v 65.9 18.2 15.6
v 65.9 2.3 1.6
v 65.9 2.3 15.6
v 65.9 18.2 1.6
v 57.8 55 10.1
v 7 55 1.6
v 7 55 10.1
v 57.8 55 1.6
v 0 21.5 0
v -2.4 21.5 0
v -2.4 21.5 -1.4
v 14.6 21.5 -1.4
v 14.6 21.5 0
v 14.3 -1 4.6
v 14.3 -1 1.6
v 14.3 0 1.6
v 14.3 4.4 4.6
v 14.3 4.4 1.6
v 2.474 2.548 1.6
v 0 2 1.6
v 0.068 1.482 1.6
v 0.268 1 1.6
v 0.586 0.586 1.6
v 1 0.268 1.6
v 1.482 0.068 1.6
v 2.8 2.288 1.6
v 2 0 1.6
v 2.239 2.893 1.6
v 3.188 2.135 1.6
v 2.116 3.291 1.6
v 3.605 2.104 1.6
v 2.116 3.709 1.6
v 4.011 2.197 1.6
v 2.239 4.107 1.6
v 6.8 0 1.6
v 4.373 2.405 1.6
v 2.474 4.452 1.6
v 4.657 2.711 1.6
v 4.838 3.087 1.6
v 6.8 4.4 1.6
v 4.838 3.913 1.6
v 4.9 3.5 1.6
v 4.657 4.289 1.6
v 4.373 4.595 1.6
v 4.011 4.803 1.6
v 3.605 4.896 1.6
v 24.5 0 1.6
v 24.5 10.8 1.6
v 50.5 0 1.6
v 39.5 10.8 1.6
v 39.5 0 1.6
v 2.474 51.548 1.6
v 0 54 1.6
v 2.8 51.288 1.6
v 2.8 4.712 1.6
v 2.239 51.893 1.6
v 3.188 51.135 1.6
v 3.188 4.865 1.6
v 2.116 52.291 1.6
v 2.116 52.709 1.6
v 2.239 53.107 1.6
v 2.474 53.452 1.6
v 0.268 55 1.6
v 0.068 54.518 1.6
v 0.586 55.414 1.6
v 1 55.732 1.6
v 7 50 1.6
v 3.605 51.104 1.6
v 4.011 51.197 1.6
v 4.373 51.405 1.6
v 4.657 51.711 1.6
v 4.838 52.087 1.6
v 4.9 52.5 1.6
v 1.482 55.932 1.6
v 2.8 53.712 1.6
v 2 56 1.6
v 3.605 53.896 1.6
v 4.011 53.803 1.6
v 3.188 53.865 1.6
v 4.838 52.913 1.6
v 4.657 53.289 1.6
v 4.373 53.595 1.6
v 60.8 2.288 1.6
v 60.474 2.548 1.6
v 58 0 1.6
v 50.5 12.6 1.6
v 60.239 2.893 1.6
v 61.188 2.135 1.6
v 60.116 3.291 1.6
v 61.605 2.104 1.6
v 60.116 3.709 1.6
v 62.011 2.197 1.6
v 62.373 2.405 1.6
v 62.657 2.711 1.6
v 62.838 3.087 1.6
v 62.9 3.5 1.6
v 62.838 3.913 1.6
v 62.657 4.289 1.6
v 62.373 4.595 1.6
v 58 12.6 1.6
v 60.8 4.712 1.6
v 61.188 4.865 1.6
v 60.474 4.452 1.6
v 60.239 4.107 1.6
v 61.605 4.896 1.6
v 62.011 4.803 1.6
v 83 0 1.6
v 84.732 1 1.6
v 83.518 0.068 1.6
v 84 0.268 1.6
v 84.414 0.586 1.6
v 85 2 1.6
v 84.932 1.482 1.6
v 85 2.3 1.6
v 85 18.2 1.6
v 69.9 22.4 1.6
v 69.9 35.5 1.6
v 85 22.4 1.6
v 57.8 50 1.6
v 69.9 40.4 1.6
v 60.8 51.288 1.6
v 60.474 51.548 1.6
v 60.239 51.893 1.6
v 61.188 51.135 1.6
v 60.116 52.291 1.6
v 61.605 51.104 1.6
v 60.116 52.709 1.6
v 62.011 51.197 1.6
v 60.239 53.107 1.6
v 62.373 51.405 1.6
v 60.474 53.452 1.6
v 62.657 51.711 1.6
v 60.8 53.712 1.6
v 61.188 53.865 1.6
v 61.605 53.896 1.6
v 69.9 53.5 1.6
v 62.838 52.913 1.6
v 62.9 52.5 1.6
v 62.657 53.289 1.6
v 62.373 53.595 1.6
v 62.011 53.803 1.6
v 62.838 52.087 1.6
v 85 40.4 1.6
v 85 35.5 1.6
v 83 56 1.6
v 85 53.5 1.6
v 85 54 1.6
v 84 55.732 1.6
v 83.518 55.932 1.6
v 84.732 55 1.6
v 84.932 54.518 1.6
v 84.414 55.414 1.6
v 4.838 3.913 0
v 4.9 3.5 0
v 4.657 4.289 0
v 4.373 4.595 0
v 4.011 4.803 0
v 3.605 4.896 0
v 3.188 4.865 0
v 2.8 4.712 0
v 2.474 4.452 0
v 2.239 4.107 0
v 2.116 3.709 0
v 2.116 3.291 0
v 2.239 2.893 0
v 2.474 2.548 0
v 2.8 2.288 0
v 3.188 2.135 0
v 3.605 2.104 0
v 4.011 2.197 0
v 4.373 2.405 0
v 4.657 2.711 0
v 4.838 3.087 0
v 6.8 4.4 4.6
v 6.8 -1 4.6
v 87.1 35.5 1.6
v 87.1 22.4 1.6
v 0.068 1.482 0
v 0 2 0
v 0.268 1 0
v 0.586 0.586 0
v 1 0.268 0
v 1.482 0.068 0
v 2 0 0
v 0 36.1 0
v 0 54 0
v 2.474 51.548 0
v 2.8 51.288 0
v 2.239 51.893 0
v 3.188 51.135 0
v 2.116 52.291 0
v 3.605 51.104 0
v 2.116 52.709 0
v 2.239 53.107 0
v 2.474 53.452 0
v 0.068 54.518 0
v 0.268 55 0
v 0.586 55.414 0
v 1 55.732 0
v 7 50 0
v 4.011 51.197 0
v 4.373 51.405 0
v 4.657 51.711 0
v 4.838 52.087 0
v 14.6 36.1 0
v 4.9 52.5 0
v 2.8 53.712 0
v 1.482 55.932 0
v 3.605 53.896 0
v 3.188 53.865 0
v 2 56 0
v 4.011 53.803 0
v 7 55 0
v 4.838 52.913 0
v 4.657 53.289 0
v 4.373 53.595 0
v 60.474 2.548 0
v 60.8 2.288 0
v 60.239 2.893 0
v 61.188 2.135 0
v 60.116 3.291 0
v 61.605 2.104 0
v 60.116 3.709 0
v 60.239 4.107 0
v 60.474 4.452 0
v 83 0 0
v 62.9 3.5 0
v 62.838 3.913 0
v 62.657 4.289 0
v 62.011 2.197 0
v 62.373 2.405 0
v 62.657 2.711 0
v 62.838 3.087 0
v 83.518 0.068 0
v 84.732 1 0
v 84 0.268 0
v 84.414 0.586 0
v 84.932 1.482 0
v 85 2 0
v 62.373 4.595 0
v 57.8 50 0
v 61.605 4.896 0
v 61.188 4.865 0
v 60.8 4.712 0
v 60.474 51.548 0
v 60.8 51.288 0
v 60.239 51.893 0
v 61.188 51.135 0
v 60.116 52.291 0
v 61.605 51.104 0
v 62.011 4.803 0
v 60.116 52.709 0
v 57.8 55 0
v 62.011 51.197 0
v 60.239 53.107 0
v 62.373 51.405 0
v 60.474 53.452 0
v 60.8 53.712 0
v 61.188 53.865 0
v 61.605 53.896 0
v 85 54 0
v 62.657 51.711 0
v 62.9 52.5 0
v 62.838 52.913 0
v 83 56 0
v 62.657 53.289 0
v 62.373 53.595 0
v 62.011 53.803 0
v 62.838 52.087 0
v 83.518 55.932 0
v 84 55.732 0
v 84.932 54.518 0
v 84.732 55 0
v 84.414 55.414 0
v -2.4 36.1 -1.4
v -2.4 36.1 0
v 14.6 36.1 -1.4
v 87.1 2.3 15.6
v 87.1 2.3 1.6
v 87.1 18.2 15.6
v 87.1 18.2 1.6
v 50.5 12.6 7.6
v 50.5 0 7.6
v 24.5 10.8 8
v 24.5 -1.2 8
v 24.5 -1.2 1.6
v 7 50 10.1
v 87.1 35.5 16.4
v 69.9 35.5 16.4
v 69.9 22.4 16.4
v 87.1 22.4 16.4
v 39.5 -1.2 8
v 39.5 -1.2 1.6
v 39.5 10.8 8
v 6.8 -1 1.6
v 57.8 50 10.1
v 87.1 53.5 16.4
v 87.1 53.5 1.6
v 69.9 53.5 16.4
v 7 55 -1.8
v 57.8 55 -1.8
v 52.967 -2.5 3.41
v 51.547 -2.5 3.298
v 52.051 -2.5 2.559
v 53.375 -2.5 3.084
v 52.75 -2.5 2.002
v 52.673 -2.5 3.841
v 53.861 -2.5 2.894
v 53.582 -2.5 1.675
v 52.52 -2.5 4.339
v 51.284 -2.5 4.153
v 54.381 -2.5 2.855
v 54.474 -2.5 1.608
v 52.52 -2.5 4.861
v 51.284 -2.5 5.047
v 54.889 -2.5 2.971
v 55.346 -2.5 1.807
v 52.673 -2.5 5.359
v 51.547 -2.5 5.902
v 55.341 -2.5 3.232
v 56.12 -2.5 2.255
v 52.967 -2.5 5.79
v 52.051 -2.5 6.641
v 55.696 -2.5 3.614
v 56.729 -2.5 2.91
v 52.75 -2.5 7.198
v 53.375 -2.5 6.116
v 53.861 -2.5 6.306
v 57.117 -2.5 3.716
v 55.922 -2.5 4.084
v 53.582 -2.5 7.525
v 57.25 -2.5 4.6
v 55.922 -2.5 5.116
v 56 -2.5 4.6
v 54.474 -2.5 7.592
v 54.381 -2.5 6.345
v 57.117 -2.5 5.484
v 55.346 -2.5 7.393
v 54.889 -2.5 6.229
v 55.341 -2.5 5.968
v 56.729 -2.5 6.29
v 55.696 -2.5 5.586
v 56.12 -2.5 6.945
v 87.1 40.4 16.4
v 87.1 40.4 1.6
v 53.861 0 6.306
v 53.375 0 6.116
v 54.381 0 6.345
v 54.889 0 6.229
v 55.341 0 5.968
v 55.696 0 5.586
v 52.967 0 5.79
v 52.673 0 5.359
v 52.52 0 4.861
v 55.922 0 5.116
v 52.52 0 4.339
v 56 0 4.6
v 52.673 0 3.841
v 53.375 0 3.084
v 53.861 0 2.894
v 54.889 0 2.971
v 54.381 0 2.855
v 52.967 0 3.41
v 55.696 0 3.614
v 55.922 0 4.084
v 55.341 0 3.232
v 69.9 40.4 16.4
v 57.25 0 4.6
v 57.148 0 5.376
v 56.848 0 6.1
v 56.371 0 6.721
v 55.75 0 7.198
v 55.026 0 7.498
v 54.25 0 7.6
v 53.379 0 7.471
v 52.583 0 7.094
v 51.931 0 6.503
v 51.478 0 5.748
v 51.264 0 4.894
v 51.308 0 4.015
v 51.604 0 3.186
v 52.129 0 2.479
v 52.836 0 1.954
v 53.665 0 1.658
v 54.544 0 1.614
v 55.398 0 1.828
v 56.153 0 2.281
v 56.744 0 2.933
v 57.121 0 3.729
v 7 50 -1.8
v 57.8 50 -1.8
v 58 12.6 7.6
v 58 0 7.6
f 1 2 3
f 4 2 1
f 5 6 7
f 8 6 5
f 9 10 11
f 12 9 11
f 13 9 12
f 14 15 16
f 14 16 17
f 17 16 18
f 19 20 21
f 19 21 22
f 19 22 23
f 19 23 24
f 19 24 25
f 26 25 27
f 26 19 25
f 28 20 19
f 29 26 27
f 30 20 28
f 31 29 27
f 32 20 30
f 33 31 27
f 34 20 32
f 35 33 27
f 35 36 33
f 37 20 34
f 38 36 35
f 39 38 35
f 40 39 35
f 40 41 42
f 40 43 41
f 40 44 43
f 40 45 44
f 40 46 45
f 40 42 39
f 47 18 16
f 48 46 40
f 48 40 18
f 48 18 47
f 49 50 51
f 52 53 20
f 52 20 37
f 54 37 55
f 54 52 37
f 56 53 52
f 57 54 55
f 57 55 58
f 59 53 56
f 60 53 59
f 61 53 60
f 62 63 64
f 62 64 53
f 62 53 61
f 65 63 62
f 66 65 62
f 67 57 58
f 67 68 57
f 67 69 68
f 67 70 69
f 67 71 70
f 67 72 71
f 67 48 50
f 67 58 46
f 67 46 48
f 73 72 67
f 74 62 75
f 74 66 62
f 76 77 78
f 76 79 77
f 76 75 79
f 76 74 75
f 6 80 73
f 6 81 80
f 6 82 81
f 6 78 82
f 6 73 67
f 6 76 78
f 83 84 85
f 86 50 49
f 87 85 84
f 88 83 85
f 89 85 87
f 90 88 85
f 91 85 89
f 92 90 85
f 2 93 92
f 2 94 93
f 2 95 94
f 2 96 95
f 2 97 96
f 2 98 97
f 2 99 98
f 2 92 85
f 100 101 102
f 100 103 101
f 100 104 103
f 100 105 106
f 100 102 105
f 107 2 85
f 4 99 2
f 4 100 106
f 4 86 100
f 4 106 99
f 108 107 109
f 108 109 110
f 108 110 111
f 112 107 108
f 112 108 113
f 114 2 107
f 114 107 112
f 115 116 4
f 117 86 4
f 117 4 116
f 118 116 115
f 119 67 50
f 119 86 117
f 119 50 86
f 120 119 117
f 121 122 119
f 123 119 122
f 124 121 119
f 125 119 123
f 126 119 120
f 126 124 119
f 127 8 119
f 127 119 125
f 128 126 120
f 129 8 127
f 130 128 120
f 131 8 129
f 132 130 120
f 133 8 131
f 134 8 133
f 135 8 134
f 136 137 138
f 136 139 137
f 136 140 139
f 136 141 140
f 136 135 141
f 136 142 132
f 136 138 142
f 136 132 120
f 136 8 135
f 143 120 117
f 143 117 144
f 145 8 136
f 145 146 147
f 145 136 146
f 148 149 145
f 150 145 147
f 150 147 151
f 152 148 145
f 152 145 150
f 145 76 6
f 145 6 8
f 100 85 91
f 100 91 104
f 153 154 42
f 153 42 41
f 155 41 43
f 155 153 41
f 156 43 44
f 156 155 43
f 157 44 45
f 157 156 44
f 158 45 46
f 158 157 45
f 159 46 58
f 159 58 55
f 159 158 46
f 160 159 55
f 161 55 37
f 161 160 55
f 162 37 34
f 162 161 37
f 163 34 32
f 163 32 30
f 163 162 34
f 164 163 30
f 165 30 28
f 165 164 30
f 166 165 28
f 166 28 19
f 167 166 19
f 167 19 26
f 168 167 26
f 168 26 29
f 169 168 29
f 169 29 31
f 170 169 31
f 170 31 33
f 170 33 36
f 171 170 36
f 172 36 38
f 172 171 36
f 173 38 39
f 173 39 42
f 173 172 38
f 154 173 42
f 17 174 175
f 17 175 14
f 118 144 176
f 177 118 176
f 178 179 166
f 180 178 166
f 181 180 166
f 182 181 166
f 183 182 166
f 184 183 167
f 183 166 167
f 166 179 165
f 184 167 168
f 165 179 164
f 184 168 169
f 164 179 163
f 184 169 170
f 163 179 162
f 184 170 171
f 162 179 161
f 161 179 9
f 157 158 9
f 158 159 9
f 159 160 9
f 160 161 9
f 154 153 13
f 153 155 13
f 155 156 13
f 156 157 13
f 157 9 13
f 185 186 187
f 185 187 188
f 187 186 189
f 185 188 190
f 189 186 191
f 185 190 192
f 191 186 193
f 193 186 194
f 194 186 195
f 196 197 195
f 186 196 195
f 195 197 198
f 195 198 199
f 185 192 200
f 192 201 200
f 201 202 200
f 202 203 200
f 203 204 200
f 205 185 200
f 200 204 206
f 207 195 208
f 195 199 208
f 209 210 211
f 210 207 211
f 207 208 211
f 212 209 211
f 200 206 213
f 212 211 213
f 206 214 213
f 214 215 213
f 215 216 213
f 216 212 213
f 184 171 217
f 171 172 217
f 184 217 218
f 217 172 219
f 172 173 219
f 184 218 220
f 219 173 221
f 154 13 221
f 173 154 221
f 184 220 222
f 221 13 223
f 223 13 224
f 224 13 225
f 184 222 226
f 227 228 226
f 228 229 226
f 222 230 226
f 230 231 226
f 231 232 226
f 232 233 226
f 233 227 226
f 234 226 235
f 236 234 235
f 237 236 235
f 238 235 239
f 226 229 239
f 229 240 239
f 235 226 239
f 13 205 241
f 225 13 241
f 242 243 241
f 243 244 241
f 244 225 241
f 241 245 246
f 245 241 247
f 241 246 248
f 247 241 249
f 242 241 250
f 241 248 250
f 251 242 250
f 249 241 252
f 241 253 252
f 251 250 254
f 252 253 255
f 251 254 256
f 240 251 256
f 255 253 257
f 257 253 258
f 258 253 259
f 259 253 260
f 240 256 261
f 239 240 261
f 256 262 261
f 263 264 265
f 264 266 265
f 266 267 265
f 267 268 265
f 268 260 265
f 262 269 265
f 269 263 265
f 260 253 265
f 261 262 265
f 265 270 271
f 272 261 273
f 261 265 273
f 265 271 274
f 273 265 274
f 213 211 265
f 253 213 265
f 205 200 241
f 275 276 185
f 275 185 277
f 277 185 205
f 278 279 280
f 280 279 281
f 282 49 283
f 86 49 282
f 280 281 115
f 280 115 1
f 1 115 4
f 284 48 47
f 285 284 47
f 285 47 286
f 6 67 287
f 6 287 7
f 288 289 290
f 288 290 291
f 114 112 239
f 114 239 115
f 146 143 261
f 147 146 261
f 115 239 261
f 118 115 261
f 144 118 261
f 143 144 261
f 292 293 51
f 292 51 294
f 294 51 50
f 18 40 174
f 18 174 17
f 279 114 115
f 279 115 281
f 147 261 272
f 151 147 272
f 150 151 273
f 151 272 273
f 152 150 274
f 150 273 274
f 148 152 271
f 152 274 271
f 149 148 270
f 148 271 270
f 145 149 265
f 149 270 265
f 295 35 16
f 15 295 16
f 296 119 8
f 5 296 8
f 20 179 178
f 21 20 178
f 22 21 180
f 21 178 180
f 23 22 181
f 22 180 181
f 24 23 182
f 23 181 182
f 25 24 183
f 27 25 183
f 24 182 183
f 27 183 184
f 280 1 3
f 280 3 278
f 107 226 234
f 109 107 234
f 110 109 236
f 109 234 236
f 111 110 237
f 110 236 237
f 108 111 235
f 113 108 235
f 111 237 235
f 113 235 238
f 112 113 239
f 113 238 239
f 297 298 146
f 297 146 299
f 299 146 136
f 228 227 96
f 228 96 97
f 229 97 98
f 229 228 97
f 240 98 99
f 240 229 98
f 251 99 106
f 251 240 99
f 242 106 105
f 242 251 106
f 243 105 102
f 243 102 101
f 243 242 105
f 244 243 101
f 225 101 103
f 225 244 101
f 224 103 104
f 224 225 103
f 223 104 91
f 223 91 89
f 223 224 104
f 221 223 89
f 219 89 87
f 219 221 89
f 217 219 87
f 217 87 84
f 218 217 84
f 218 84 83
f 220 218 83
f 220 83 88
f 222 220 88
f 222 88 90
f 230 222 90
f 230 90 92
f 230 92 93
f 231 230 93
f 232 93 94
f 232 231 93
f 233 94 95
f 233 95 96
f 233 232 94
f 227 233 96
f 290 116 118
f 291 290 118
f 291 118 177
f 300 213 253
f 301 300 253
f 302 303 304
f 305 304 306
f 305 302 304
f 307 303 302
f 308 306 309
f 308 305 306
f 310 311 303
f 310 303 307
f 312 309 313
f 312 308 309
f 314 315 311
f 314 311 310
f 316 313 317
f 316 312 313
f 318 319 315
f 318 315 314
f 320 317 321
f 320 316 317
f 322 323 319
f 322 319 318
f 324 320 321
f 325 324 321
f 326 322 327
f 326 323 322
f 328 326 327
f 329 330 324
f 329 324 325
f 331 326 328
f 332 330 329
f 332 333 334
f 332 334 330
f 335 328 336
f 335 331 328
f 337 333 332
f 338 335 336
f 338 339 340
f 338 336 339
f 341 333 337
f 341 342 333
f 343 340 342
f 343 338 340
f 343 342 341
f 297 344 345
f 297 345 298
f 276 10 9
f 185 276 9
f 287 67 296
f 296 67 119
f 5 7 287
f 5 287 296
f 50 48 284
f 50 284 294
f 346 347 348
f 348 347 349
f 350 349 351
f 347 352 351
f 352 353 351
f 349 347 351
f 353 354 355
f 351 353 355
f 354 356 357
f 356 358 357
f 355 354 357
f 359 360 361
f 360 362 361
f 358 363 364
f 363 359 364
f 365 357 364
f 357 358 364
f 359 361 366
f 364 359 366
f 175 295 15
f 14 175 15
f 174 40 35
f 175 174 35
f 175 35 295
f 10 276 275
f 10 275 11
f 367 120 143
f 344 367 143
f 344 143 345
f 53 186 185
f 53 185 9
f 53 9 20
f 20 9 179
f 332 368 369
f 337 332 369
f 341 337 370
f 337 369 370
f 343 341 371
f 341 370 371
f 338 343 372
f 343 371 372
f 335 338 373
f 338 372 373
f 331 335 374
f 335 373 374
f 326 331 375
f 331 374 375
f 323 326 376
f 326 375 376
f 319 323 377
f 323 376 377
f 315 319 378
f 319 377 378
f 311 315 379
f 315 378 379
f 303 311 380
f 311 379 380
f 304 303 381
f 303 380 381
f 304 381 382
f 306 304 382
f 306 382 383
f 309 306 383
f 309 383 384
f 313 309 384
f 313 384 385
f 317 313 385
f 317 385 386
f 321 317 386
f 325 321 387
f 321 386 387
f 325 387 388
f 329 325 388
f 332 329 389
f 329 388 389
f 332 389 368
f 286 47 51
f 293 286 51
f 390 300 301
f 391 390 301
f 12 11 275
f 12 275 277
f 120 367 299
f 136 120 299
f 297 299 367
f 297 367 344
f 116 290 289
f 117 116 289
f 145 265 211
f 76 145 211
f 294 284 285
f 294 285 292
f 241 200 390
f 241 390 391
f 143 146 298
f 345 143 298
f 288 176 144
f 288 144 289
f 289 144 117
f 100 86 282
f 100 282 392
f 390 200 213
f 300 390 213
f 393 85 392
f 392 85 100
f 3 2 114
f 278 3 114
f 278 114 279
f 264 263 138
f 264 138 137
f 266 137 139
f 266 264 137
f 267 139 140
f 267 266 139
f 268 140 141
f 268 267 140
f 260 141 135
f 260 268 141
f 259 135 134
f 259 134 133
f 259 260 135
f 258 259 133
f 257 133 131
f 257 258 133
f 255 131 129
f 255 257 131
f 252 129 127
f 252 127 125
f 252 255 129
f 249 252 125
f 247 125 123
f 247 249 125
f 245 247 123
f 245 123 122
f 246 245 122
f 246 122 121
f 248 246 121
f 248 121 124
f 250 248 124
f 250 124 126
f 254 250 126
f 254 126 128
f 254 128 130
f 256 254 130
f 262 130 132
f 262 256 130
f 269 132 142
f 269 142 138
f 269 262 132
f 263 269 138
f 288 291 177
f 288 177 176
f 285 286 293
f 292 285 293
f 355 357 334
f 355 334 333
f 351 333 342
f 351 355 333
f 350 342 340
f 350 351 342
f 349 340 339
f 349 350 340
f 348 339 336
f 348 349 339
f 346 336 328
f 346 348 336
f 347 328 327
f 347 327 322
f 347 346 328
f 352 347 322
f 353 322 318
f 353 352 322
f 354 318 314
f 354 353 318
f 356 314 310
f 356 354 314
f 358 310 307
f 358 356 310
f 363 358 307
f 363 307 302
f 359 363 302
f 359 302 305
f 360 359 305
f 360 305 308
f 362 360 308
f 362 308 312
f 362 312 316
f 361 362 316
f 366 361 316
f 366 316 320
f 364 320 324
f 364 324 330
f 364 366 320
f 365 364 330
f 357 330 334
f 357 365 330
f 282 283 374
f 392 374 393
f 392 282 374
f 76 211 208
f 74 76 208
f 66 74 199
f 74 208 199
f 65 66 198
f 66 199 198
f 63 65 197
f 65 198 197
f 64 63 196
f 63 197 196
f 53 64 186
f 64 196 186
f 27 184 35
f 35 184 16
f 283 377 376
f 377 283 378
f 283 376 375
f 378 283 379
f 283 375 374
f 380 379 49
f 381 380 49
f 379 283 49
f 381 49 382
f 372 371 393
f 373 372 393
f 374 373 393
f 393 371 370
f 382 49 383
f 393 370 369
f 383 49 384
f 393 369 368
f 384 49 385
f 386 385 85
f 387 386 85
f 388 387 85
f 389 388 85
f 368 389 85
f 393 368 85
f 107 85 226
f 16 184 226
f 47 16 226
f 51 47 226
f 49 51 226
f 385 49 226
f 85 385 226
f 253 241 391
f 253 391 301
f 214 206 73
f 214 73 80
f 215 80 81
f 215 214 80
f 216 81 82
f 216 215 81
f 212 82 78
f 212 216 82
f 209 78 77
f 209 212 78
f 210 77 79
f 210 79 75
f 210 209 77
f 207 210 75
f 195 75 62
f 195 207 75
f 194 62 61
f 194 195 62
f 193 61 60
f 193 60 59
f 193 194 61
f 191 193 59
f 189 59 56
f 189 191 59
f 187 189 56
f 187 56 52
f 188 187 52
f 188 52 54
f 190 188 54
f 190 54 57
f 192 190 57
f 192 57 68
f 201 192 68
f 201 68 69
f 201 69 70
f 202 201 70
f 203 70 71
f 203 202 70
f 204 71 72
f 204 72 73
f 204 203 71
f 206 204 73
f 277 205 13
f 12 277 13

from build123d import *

# Parameters (mm, degrees)
F0_R      = 1.4
F1_DEPTH  = 1.6
F2_W      = 15.1
F2_H      = 13.1
F2_W_2    = 2.1
F3_DEPTH  = 14.8
F2_W_3    = 19.1
F2_H_2    = 15.9
F4_DEPTH  = 14
F5_W      = 50.8
F5_H      = 5
F6_DEPTH  = 8.5
F7_DEPTH  = 3.4
F8_W      = 17
F8_H      = 14.6
F9_DEPTH  = 1.4
F10_W     = 7.5
F10_H     = 4.4
F10_H_2   = 1
F11_DEPTH = 3
F10_W_2   = 15
F10_H_3   = 10.8
F10_H_4   = 1.2
F12_DEPTH = 6.4
F10_H_5   = 12.6
F13_DEPTH = 6
F14_R     = 3
F14_R_2   = 1.75
F15_DEPTH = 2.5


with BuildPart() as f1:
    # F0 (on Top) → F1 (new body)
    with BuildSketch(Plane.XY):
        with BuildLine():
            ThreePointArc((0, 2), (0.585786, 0.585786), (2, 0))
            Line((2, 0), (83, 0))
            ThreePointArc((83, 0), (84.414214, 0.585786), (85, 2))
            Line((85, 2), (85, 54))
            ThreePointArc((85, 54), (84.414214, 55.414214), (83, 56))
            Line((83, 56), (2, 56))
            ThreePointArc((2, 56), (0.585786, 55.414214), (0, 54))
            Line((0, 54), (0, 2))
        make_face()
        with Locations((3.5, 3.5)):
            Circle(F0_R, mode=Mode.SUBTRACT)
        with Locations((61.5, 3.5)):
            Circle(F0_R, mode=Mode.SUBTRACT)
        with Locations((3.5, 52.5)):
            Circle(F0_R, mode=Mode.SUBTRACT)
        with Locations((61.5, 52.5)):
            Circle(F0_R, mode=Mode.SUBTRACT)
    extrude(amount=F1_DEPTH)

    # F2 (on face) → F3 (join)
    with BuildSketch(Plane.XY.offset(1.6)):
        with Locations((77.45, 46.95)):
            Rectangle(F2_W, F2_H)
        with Locations((86.05, 46.95)):
            Rectangle(F2_W_2, F2_H)
        with Locations((77.45, 28.95)):
            Rectangle(F2_W, F2_H)
        with Locations((86.05, 28.95)):
            Rectangle(F2_W_2, F2_H)
    extrude(amount=F3_DEPTH)

    # F2 (on face) → F4 (join)
    with BuildSketch(Plane.XY.offset(1.6)):
        with Locations((75.45, 10.25)):
            Rectangle(F2_W_3, F2_H_2)
        with Locations((86.05, 10.25)):
            Rectangle(F2_W_2, F2_H_2)
    extrude(amount=F4_DEPTH)

    # F5 (on face) → F6 (join)
    with BuildSketch(Plane.XY.offset(1.6)):
        with Locations((32.4, 52.5)):
            Rectangle(F5_W, F5_H)
    extrude(amount=F6_DEPTH)

    # F5 (on face) → F7 (join)
    with BuildSketch(Plane.XY.offset(1.6)):
        with Locations((32.4, 52.5)):
            Rectangle(F5_W, F5_H)
    extrude(amount=-F7_DEPTH)

    # F8 (on face) → F9 (join)
    with BuildSketch(Plane(origin=(0, 0, 0), x_dir=(1, 0, 0), z_dir=(0, 0, -1))):
        with Locations((6.1, -28.8)):
            Rectangle(F8_W, F8_H)
    extrude(amount=F9_DEPTH)

    # F10 (on face) → F11 (join)
    with BuildSketch(Plane.XY.offset(1.6)):
        with Locations((10.55, 2.2)):
            Rectangle(F10_W, F10_H)
        with Locations((10.55, -0.5)):
            Rectangle(F10_W, F10_H_2)
    extrude(amount=F11_DEPTH)

    # F10 (on face) → F12 (join)
    with BuildSketch(Plane.XY.offset(1.6)):
        with Locations((32, 5.4)):
            Rectangle(F10_W_2, F10_H_3)
        with Locations((32, -0.6)):
            Rectangle(F10_W_2, F10_H_4)
    extrude(amount=F12_DEPTH)

    # F10 (on face) → F13 (join)
    with BuildSketch(Plane.XY.offset(1.6)):
        with Locations((54.25, 6.3)):
            Rectangle(F10_W, F10_H_5)
    extrude(amount=F13_DEPTH)

    # F14 (on face) → F15 (join)
    with BuildSketch(Plane.XZ):
        with Locations((54.25, 4.6)):
            Circle(F14_R)
        with Locations((54.25, 4.6)):
            Circle(F14_R_2, mode=Mode.SUBTRACT)
    extrude(amount=F15_DEPTH)


solid = f1.part
